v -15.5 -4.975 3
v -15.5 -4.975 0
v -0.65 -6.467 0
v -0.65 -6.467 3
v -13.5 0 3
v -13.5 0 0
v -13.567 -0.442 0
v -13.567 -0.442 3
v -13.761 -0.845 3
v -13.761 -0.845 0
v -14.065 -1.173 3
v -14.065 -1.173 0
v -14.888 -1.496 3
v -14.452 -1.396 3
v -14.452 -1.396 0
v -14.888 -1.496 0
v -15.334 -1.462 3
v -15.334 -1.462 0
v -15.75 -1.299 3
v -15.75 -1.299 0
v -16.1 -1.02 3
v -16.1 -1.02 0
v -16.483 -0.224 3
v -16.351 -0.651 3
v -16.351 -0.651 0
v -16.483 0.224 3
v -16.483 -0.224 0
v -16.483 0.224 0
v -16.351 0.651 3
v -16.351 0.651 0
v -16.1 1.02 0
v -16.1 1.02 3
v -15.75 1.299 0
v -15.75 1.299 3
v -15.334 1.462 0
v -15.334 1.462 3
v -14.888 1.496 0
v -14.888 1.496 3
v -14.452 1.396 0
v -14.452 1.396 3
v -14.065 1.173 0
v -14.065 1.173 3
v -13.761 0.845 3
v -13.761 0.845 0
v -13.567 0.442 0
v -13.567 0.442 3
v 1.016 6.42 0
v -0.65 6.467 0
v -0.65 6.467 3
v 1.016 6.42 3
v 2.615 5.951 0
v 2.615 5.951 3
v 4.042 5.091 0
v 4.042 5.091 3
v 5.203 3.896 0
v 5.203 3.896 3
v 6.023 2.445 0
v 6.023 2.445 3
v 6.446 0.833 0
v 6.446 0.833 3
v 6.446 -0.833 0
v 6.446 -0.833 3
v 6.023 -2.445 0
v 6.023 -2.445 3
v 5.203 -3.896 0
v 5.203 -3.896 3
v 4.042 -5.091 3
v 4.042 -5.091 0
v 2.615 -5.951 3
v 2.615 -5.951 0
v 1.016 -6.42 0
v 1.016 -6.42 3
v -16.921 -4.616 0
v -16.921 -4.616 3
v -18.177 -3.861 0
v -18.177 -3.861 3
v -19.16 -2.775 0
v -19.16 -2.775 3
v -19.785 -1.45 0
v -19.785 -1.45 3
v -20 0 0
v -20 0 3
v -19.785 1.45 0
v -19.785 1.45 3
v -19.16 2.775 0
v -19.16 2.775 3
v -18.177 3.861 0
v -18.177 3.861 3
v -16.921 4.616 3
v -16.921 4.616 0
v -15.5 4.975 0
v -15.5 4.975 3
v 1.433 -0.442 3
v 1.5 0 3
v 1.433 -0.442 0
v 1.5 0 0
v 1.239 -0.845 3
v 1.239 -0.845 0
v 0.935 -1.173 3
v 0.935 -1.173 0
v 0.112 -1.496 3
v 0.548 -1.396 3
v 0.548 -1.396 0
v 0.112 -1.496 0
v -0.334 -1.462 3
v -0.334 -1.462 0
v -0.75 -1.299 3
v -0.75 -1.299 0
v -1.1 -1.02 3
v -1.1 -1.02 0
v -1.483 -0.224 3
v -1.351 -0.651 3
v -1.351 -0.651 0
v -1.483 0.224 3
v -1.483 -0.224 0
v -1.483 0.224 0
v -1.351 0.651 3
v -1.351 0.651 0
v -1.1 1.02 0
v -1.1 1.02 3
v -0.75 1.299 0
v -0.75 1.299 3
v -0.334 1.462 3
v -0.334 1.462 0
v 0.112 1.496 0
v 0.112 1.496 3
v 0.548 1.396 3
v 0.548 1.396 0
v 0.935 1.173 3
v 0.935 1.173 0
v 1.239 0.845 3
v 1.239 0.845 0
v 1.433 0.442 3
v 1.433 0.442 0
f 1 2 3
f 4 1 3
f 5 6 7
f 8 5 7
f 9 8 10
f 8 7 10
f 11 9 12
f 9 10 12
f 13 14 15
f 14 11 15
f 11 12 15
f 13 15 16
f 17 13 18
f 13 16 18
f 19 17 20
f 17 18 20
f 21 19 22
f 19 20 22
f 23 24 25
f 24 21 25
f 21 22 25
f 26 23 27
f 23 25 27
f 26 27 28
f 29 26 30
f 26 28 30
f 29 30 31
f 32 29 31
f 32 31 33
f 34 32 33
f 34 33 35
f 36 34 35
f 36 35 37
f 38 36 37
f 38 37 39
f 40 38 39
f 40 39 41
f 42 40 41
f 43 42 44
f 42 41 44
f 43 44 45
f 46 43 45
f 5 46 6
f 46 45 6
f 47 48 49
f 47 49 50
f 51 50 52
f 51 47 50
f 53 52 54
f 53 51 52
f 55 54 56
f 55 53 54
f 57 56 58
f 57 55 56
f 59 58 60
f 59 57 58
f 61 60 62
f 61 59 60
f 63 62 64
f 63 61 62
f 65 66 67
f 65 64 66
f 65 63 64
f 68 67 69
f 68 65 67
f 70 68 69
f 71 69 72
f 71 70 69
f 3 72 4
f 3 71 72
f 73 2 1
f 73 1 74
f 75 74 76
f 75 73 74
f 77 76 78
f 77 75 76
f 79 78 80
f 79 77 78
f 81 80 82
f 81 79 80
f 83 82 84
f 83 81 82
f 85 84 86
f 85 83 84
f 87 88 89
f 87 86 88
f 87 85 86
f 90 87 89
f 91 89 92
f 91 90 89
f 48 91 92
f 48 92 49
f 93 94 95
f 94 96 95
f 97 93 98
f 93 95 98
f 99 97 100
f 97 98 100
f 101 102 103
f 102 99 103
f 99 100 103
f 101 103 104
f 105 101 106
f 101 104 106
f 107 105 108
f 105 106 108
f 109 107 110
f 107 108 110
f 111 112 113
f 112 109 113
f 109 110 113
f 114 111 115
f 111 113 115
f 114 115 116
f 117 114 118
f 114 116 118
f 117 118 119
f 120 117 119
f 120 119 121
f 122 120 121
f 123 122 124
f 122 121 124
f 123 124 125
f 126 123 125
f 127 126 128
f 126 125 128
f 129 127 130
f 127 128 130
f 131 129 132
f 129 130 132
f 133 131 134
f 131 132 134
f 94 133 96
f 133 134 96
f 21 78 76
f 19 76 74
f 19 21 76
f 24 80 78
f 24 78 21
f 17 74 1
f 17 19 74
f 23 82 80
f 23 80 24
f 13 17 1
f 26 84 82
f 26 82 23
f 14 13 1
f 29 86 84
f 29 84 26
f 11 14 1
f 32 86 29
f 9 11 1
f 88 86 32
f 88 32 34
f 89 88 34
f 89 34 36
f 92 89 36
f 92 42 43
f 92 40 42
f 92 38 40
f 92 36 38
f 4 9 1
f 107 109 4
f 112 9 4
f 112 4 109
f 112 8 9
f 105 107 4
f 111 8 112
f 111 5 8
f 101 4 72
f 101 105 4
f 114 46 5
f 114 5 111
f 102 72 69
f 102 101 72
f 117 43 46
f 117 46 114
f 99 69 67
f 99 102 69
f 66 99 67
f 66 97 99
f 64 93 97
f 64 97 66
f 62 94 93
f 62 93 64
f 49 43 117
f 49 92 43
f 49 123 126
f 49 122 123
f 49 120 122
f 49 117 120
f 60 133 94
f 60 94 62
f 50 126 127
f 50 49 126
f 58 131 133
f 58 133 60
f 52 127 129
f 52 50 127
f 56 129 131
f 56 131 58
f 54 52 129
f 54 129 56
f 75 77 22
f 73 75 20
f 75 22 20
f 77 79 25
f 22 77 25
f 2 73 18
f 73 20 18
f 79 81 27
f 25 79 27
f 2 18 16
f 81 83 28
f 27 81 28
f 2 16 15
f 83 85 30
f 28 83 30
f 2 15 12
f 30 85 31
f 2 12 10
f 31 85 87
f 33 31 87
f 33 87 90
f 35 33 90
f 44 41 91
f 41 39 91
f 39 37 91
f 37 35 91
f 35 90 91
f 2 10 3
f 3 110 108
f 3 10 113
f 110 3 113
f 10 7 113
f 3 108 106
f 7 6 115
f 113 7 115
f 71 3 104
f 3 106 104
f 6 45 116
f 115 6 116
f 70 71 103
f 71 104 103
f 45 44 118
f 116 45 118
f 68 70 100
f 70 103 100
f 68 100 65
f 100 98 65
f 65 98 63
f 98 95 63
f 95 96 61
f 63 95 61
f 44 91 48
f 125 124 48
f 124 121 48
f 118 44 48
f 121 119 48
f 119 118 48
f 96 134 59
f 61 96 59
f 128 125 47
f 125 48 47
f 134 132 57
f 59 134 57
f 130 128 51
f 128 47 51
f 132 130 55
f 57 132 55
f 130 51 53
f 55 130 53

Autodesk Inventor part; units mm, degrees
ref_plane "YZ Plane" through (0, 0, 0) normal (1, 0, 0) x (0, 1, 0)
ref_plane "XZ Plane" through (0, 0, 0) normal (0, 1, 0) x (-1, 0, 0)
ref_plane "XY Plane" through (0, 0, 0) normal (0, 0, 1) x (1, 0, 0)
sketch "スケッチ1" plane through (0, 0, 0) normal (0, 0, 1) x (1, 0, 0)
  line L0 (0, 0) -> (-15, 0) construction
  line L1 (0, 5) -> (-15, 5) construction
  line L2 (-15, -5) -> (0, -5) construction
  arc A0 (0, -5) -> (0, 5) centre (0, 0) ccw construction
  arc A1 (-15, 5) -> (-15, -5) centre (-15, 0) ccw
  circle A2 centre (-15, 0) radius 1.5
  circle A3 centre (0, 0) radius 1.5
  arc A4 (-0.65, 6.4674) -> (-0.65, -6.4674) centre (0, 0) ccw construction
  line L3 (-15.5, 4.9749) -> (-0.65, 6.4674)
  line L4 (-15.5, -4.9749) -> (-0.65, -6.4674)
  arc A5 (-0.65, -6.4674) -> (-0.65, 6.4674) centre (0, 0) ccw
  point P0 (-7.5, 0)
  dimension "d0" = 15
  dimension "d1" = 10
  dimension "d2" = 3
  dimension "d3" = 3
  dimension "d4" = 13
extrude "押し出し1" add sketch "スケッチ1" along normal blind 3
properties part number "ウィング抑え" material "ポリカーボネート、スモーク"
